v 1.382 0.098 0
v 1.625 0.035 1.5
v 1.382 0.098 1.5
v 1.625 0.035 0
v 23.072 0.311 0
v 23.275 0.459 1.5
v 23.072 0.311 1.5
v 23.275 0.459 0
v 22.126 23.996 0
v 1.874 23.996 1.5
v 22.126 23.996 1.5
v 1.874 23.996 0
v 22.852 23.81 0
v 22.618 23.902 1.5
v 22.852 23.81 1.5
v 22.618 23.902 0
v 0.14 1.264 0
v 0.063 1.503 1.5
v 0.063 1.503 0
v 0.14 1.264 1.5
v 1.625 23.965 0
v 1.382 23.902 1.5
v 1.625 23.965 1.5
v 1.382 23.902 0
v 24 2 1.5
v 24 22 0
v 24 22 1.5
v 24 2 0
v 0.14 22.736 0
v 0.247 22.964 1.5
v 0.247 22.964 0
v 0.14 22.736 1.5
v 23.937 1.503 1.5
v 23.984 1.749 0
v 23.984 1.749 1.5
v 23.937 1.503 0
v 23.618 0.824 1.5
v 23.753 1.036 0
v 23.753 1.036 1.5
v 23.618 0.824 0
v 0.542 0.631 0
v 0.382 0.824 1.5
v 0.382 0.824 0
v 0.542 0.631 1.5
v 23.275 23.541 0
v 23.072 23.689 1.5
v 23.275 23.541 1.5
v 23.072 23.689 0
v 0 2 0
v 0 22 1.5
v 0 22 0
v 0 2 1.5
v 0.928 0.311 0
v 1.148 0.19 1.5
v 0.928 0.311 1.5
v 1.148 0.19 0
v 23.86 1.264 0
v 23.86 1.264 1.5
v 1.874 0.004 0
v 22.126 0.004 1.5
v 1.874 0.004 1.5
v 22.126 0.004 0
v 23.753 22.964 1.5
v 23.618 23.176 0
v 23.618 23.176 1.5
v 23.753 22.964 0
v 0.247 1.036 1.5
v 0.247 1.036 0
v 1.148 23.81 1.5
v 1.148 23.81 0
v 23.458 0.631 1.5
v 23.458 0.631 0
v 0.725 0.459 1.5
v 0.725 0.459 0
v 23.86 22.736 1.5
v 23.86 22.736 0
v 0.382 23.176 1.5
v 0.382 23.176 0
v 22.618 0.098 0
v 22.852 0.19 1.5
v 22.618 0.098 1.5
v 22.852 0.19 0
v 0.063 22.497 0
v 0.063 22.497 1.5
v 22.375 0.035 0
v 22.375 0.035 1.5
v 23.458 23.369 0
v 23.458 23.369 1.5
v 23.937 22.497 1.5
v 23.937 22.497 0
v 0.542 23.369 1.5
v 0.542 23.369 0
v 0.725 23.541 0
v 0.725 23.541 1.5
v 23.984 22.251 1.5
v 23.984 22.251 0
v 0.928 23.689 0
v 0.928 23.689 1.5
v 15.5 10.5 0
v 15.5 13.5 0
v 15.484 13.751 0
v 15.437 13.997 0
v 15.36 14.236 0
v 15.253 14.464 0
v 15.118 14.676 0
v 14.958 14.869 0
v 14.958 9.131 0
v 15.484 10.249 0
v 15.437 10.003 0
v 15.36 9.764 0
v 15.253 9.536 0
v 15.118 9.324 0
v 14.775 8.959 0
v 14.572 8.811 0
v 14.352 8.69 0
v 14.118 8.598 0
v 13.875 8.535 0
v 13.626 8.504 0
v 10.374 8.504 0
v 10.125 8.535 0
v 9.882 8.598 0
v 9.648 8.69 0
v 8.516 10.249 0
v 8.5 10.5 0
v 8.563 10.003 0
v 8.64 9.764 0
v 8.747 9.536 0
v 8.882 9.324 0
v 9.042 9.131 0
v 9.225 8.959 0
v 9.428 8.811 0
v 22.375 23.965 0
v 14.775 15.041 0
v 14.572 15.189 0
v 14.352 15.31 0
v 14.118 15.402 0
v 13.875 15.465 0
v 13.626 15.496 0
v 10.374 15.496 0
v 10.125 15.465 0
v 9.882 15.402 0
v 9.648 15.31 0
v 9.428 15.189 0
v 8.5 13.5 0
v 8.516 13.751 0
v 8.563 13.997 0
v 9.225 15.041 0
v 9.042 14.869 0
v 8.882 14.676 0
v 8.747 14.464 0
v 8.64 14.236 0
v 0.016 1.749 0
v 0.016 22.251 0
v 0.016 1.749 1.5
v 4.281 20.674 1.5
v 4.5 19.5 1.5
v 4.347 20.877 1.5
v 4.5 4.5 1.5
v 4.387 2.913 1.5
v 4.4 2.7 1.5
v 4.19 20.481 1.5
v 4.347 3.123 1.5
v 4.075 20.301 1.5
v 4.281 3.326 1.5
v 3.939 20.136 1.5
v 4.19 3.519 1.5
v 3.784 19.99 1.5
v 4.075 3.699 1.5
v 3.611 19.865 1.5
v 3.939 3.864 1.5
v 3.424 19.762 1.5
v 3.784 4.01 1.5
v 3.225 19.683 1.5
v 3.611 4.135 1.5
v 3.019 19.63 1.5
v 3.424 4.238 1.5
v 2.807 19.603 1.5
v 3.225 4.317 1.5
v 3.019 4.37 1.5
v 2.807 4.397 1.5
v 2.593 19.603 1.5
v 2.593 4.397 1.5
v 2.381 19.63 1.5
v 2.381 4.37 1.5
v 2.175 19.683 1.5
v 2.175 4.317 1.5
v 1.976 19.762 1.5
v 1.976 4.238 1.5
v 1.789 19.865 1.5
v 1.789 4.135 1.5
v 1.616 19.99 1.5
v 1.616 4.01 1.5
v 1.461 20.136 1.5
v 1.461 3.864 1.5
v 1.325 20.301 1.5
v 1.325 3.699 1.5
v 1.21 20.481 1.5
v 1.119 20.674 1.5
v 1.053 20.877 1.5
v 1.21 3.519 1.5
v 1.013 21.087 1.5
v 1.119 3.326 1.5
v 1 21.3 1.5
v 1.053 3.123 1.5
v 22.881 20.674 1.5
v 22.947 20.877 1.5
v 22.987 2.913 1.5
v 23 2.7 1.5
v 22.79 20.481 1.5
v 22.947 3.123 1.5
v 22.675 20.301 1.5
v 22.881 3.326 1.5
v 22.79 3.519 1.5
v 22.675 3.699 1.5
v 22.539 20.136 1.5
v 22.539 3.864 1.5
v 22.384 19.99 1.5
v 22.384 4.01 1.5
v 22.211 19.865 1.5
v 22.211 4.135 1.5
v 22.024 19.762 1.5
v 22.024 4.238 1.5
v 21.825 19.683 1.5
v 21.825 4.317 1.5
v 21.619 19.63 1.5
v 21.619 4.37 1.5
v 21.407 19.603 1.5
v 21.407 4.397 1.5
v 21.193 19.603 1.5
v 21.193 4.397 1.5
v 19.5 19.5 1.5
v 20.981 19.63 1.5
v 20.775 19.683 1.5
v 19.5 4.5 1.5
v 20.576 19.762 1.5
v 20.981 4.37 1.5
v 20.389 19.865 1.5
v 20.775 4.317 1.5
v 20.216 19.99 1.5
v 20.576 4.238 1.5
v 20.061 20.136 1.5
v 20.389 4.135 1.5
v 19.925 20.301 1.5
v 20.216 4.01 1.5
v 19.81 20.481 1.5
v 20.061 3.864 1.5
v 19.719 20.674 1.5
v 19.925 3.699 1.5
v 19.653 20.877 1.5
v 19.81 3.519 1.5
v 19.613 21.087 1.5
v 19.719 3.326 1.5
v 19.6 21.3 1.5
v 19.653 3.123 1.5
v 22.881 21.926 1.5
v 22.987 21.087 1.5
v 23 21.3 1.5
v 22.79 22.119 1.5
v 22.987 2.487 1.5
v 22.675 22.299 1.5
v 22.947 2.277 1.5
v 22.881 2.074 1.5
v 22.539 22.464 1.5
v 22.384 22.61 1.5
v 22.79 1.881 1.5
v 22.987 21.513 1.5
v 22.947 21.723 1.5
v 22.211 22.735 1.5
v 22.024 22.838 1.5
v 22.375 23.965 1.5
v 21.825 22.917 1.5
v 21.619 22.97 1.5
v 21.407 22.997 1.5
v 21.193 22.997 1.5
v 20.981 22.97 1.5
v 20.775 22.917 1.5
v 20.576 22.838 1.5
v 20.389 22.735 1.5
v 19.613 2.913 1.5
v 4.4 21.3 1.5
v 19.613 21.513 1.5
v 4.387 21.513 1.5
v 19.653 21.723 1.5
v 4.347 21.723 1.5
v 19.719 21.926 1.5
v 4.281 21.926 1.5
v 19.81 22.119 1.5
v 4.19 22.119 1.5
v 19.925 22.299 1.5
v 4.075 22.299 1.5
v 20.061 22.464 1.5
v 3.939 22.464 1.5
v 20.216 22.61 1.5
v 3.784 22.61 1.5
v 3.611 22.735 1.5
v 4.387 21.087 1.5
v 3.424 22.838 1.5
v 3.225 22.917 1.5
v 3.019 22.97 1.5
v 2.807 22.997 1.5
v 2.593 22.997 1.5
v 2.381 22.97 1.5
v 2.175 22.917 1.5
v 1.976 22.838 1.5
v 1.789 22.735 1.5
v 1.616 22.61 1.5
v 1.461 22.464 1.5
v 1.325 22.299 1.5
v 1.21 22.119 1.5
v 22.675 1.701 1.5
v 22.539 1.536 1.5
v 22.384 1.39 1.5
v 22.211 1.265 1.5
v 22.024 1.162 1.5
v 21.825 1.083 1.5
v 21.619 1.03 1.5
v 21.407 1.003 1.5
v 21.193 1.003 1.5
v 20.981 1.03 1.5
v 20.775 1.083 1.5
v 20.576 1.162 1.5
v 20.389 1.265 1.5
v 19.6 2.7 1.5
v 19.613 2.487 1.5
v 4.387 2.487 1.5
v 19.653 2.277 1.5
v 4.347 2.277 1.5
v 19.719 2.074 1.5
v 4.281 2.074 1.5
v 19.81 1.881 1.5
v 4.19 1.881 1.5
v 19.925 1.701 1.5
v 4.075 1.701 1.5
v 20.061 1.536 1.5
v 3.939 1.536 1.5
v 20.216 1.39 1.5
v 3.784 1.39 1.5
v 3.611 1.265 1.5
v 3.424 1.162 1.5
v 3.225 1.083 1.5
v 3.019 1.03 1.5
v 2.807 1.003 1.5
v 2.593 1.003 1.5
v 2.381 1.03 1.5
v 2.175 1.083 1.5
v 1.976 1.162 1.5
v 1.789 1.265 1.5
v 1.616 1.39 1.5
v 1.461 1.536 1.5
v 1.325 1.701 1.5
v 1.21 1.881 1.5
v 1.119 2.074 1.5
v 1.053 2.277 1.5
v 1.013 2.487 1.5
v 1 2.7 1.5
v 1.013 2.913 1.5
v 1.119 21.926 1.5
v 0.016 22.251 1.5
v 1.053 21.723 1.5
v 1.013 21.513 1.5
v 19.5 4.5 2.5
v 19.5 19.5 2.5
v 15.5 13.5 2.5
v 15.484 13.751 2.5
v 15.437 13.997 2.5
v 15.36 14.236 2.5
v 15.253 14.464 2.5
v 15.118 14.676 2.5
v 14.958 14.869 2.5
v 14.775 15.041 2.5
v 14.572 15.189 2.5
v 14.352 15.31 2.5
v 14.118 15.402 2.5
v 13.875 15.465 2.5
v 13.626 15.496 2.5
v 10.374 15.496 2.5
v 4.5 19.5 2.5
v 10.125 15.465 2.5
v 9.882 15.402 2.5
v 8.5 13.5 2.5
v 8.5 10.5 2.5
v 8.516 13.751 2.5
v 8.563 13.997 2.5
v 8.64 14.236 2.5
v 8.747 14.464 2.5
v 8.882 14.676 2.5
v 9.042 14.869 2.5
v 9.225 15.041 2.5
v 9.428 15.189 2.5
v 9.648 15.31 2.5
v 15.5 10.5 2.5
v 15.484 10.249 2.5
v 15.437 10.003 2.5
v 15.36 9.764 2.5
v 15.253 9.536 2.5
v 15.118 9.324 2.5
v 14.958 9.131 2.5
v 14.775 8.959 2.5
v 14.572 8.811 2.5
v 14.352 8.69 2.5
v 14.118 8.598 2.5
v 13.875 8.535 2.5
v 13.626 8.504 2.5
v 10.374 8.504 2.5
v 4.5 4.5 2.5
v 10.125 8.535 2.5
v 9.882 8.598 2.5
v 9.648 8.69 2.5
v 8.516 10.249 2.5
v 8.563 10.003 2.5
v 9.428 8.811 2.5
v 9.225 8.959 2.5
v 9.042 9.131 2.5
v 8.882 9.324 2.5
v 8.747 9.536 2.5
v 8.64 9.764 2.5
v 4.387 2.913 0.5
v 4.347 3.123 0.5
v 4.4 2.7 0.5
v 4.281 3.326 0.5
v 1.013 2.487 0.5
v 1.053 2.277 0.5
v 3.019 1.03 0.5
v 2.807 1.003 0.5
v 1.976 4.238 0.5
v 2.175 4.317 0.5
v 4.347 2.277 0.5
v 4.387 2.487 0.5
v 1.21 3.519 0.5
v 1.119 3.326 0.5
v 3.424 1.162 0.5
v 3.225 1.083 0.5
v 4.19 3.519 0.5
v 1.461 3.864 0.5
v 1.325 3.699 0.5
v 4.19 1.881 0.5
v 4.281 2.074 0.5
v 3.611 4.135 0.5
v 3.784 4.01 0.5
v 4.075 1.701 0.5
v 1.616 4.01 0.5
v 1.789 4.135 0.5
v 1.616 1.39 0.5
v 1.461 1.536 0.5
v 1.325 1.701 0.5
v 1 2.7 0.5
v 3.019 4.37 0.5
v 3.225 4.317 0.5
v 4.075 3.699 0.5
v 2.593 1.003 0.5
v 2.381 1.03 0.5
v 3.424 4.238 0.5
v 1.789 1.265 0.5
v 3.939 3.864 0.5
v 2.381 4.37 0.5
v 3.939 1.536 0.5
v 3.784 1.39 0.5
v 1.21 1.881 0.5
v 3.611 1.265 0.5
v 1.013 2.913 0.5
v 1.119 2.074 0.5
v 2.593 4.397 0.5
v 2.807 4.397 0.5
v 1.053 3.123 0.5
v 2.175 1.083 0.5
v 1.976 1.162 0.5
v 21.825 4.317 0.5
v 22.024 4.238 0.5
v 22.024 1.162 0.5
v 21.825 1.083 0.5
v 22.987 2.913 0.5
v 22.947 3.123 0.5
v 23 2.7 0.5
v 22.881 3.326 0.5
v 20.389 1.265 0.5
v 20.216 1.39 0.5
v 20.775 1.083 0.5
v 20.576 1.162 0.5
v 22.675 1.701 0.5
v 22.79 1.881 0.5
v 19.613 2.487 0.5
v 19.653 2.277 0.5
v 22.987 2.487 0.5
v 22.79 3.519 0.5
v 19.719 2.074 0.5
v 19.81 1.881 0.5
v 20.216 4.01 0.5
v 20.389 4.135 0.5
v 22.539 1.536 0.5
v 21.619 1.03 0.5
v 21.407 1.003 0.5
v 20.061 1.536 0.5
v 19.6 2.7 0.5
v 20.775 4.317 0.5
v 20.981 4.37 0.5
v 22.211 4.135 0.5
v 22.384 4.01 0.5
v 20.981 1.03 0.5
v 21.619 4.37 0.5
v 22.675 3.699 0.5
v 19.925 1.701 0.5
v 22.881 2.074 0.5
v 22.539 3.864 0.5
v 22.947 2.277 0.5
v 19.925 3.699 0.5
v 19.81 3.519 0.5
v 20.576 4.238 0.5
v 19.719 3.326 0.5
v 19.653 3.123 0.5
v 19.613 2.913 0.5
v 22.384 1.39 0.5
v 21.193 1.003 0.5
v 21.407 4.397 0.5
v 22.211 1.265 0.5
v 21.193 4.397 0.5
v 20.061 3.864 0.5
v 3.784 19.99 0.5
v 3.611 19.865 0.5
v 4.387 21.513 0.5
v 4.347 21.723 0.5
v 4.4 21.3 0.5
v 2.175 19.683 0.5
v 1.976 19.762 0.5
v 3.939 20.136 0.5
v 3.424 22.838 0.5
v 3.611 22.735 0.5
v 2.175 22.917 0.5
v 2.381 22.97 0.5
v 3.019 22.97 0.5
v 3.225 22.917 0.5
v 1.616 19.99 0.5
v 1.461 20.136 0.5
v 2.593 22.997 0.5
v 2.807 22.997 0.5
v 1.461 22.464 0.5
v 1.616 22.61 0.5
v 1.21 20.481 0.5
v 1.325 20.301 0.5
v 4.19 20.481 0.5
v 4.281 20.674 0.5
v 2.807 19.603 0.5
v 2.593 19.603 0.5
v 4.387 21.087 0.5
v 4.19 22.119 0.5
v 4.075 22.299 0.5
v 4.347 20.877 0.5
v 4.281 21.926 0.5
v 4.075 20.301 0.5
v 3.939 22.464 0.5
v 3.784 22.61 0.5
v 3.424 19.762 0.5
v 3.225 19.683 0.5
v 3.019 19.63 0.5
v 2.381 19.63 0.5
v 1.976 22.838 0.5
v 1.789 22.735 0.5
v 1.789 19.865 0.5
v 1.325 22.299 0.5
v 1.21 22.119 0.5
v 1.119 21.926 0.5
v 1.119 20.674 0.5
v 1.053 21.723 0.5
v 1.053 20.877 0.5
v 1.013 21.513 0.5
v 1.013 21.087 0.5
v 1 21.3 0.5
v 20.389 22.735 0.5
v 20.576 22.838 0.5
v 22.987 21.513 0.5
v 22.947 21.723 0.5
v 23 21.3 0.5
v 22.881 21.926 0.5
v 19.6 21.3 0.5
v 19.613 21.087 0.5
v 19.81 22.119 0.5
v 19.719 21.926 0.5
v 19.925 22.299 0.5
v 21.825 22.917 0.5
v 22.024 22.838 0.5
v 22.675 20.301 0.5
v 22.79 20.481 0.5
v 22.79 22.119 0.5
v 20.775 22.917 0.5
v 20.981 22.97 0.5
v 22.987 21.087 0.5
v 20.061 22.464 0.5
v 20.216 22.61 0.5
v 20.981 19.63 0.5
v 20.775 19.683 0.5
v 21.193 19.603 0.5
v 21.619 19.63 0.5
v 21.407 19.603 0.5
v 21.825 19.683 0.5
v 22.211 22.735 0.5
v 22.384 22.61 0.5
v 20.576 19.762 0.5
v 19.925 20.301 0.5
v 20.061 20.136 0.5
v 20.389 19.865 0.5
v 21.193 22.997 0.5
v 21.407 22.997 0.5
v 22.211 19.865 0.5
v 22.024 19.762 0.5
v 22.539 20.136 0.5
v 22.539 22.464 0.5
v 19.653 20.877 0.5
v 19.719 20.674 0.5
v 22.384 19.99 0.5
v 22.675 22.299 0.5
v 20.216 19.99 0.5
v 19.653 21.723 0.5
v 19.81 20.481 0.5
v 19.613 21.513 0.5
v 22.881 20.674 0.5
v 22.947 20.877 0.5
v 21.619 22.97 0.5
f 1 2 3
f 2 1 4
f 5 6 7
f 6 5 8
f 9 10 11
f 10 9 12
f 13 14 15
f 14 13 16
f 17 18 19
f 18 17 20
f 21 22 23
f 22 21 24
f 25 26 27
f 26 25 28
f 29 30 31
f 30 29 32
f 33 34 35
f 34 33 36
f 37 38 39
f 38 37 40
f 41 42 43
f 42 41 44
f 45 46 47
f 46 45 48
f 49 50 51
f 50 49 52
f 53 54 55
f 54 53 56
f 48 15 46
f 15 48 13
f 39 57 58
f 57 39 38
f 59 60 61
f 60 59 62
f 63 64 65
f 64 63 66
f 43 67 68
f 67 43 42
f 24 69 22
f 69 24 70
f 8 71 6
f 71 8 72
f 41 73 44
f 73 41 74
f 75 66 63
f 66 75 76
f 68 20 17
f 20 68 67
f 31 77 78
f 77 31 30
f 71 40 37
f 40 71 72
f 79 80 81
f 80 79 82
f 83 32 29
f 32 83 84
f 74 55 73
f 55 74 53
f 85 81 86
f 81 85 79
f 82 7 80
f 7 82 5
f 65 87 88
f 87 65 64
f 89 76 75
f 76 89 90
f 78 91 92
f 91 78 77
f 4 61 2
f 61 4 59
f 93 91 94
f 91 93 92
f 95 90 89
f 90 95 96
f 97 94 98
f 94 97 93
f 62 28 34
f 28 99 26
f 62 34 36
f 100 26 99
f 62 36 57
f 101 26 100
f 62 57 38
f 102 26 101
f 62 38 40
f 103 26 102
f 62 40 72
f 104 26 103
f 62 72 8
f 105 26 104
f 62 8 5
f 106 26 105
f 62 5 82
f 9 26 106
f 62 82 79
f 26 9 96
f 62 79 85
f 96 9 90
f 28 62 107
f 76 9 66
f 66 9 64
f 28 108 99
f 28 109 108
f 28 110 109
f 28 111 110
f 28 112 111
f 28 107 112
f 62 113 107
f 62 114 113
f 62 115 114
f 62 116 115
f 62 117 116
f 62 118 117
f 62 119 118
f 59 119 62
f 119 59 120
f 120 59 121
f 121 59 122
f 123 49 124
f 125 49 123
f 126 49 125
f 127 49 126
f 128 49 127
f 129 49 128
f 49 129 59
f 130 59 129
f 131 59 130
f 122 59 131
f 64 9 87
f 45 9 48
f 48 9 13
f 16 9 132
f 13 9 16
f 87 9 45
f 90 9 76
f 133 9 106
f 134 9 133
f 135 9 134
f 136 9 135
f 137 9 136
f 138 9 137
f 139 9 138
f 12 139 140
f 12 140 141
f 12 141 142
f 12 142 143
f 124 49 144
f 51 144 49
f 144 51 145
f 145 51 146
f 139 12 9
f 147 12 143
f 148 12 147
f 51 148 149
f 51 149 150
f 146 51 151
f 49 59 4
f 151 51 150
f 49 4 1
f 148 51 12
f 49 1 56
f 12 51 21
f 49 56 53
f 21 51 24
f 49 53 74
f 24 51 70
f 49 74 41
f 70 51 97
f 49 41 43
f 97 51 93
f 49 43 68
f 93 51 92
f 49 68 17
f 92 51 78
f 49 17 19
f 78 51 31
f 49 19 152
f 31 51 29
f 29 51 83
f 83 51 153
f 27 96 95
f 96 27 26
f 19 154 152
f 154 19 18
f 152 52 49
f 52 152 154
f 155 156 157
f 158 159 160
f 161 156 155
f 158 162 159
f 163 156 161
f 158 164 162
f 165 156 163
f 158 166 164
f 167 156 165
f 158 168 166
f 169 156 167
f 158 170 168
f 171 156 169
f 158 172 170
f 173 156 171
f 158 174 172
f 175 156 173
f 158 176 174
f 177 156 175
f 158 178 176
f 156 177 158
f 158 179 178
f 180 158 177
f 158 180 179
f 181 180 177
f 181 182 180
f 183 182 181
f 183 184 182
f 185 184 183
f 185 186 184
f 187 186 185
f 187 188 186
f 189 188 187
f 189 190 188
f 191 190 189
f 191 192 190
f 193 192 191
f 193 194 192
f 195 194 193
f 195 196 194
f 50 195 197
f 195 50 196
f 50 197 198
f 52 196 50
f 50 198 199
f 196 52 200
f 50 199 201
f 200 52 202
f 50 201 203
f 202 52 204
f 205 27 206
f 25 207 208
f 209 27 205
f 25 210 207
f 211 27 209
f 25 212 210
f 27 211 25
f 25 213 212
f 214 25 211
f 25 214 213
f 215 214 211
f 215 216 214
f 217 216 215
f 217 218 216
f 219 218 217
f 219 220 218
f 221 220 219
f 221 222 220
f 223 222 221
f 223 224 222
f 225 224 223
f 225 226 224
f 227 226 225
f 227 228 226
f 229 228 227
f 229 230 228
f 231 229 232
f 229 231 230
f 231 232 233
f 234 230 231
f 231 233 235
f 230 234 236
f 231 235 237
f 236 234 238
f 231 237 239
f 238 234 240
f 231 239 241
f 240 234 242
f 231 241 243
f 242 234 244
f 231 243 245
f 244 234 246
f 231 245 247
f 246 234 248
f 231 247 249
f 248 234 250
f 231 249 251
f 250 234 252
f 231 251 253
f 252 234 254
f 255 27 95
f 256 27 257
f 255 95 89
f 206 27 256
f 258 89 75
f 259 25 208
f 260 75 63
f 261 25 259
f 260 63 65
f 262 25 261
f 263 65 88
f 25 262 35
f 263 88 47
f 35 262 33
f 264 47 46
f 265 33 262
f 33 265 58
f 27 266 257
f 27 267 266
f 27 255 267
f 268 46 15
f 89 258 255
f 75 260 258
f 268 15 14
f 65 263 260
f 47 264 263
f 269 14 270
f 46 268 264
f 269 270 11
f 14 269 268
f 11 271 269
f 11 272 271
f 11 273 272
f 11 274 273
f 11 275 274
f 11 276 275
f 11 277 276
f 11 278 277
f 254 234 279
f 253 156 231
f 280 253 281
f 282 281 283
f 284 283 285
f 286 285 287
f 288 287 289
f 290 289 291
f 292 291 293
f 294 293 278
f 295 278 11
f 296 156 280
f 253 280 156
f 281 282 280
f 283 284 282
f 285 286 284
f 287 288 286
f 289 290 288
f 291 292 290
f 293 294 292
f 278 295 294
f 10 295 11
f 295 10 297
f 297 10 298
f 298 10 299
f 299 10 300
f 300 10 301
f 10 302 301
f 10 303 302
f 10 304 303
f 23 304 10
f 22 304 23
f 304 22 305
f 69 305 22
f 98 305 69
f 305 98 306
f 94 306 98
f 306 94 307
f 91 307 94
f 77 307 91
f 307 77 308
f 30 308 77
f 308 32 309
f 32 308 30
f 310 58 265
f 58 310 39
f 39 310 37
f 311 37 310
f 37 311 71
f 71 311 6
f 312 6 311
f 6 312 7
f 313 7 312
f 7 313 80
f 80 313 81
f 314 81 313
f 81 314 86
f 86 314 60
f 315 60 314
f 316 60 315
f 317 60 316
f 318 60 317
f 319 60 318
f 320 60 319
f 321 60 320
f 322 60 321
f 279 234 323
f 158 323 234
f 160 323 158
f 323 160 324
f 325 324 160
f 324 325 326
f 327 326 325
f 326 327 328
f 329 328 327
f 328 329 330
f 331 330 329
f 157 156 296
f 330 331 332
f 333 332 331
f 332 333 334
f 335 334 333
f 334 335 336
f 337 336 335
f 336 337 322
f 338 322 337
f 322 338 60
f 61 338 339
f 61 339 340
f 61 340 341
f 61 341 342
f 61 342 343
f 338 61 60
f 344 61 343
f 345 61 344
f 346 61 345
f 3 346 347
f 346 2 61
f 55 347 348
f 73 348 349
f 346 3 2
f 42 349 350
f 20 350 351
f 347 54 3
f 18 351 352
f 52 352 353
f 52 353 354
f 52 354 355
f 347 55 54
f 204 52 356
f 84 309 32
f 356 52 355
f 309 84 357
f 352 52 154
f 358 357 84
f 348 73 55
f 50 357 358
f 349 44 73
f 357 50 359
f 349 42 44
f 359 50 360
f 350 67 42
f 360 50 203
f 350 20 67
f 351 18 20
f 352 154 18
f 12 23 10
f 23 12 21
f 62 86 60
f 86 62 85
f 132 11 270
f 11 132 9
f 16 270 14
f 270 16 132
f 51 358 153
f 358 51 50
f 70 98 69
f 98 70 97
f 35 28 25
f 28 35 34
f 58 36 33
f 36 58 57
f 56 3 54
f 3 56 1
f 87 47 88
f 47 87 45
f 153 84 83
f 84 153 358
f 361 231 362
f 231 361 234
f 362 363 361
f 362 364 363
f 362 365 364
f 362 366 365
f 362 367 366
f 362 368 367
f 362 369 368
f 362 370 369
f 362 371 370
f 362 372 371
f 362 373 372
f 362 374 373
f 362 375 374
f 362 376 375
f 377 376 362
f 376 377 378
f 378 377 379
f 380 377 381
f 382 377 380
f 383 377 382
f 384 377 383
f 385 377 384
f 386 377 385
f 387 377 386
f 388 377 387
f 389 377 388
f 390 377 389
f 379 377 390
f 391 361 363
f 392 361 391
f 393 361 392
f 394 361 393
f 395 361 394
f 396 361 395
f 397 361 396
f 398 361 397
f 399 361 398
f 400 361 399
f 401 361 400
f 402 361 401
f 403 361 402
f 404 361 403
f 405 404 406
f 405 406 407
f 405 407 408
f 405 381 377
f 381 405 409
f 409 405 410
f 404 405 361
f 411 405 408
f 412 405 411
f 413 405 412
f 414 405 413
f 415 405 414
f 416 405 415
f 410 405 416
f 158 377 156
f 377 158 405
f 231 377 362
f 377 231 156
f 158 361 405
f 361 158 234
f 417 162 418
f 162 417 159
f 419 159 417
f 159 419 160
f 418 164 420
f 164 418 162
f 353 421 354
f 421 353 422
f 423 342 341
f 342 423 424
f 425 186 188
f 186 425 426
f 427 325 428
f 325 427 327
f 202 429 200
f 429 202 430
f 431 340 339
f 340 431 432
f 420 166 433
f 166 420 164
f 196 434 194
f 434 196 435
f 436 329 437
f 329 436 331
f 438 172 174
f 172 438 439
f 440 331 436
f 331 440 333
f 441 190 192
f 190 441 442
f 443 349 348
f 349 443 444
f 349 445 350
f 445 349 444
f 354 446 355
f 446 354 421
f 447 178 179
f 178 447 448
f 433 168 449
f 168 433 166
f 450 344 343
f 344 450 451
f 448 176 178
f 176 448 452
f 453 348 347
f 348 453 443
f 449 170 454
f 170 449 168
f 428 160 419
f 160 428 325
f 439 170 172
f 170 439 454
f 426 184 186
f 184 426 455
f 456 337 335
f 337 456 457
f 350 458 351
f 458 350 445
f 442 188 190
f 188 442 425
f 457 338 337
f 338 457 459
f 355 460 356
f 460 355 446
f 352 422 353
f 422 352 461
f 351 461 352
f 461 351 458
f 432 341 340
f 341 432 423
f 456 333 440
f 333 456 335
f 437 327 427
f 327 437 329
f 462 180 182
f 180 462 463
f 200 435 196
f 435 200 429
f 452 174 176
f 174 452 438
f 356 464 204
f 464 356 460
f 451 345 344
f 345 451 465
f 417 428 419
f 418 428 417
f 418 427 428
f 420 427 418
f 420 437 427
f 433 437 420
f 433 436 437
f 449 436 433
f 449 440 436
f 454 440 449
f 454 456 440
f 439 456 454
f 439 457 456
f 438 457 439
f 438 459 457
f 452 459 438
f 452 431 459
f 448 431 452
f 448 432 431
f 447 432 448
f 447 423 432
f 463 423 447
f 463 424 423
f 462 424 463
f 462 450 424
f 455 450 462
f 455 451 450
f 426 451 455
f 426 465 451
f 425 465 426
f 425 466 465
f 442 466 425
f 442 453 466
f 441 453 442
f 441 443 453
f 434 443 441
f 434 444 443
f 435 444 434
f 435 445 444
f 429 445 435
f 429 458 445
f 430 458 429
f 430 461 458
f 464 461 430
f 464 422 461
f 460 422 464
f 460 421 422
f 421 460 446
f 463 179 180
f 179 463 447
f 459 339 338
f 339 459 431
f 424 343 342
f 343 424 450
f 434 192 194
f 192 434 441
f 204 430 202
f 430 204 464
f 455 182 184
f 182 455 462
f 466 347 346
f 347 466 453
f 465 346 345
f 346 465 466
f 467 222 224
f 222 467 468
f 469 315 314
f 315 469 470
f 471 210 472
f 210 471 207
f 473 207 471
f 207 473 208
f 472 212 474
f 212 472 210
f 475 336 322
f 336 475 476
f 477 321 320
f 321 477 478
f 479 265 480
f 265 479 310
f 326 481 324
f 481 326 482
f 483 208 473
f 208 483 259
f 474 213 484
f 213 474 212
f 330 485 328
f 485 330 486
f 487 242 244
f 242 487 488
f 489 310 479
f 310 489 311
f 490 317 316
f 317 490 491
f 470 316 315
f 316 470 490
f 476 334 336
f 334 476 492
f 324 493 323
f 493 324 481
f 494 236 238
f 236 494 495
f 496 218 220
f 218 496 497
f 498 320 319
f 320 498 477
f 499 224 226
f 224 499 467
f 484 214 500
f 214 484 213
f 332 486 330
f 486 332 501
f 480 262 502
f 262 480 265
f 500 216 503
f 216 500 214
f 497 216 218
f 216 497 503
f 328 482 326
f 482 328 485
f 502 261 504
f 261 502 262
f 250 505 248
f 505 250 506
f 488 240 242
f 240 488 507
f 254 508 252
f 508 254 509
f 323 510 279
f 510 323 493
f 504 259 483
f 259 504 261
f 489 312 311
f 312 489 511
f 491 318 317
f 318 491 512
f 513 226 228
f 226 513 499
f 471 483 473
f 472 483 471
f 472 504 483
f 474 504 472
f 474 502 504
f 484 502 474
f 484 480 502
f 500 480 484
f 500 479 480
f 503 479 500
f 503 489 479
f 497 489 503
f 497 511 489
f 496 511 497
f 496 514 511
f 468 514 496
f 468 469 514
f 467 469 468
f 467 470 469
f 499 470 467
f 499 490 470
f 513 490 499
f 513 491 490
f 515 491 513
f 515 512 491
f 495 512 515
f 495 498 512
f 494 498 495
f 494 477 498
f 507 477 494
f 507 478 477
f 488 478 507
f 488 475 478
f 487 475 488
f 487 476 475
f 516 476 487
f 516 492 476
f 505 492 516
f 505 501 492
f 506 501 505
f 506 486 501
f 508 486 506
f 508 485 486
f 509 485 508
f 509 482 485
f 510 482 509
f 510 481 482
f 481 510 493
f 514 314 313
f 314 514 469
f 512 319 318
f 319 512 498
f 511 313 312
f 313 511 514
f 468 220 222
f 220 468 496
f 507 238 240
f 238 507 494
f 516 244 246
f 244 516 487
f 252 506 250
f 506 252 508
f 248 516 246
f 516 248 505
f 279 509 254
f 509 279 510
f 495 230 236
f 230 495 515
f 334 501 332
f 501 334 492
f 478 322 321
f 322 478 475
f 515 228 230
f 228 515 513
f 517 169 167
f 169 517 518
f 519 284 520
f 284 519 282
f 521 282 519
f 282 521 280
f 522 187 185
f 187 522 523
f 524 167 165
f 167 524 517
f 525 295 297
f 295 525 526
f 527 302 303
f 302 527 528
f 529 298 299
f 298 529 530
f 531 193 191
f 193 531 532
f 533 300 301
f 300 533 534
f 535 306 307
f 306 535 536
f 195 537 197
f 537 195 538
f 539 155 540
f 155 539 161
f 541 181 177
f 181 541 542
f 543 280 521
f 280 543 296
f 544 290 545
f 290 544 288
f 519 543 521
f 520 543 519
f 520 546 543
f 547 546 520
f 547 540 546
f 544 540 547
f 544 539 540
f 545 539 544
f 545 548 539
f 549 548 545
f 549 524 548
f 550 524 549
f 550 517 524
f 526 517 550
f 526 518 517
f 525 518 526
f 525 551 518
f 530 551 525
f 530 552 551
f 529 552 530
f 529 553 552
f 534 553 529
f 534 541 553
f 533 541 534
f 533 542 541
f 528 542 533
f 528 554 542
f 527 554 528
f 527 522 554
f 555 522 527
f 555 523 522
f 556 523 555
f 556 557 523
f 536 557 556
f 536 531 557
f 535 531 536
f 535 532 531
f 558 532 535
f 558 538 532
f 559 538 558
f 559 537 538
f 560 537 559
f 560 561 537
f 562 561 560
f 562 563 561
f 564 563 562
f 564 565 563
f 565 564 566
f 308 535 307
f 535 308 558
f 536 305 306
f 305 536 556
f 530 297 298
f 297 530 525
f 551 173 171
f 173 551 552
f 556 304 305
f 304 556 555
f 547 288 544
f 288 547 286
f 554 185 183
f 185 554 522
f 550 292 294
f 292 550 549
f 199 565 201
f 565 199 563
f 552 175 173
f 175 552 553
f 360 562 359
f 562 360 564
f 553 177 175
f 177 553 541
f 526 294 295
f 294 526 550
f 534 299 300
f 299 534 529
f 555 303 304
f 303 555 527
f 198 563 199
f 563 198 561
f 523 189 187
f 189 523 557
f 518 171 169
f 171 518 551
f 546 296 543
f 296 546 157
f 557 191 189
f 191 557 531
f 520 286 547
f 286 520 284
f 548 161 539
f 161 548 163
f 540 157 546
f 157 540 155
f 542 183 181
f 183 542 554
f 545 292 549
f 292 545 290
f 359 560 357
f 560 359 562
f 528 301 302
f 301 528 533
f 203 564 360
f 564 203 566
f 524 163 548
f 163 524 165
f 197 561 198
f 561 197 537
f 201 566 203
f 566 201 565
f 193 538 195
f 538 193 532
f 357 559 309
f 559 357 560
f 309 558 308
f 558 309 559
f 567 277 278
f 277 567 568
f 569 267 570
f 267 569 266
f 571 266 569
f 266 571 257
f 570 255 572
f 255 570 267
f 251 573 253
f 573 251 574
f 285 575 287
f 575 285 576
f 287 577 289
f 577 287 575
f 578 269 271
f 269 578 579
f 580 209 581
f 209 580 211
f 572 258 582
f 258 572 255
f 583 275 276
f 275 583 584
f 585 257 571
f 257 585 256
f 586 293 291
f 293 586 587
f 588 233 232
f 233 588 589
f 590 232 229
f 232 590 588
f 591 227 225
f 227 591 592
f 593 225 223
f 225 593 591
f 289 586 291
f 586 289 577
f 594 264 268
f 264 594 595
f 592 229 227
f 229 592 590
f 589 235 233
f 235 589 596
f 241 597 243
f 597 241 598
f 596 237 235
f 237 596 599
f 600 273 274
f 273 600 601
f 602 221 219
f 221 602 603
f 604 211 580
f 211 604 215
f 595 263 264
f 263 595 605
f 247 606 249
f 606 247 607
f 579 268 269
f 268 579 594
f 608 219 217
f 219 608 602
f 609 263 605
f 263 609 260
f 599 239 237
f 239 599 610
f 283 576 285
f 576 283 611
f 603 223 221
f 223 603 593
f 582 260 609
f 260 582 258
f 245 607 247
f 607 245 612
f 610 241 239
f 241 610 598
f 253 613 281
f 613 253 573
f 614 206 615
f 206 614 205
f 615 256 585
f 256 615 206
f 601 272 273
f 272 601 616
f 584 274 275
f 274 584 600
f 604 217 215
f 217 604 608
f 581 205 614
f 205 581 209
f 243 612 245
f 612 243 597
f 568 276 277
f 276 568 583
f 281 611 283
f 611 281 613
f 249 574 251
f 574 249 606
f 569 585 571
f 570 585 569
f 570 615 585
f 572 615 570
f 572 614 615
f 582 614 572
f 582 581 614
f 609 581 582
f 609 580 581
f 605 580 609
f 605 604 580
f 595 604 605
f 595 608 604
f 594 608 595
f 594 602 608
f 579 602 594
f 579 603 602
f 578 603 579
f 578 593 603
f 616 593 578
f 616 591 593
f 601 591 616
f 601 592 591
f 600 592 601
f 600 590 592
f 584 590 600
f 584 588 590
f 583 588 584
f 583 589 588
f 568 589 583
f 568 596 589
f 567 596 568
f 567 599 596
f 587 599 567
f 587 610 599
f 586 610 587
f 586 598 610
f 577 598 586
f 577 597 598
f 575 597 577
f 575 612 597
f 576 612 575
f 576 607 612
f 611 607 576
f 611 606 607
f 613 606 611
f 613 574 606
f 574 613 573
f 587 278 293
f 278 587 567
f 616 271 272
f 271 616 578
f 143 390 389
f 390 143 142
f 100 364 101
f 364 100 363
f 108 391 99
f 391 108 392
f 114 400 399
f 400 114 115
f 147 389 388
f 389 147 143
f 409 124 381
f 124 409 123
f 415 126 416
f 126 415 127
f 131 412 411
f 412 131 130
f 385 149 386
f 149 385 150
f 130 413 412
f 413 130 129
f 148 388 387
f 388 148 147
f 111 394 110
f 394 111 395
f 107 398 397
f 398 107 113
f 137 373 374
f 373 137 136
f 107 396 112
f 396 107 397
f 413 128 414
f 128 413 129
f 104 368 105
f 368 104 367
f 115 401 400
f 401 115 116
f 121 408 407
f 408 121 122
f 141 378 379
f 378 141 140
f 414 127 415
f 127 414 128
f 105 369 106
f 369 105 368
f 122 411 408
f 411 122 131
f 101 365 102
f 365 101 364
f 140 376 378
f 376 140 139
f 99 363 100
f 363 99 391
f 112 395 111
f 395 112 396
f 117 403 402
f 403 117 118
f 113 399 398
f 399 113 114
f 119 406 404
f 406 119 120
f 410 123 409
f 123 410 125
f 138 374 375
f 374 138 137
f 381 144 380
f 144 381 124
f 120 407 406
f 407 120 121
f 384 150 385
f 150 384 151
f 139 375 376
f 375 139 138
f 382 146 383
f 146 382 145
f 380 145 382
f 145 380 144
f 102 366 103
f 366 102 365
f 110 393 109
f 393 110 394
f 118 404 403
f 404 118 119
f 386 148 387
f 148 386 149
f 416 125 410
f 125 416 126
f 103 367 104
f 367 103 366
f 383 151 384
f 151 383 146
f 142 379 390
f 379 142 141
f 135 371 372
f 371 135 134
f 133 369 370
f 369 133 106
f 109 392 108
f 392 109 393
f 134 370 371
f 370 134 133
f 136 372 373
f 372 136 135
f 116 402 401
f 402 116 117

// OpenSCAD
// file: ../../lib/flat_rounded_cube.scad
$bleed = 1;
$rounding = 3;

min_cylinder_height = 1;

module flat_rounded_cube(size) {
  width = size[0] - $rounding * 2;
  length = size[1] - $rounding * 2;

  // Only 1 count of min_cynlinder_height not 2;
  // cylinder does not extend the bottom because it's flush
  height = size[2] - min_cylinder_height; 

  minkowski() {
    translate([$rounding, $rounding, 0]) {
      cube([width, length, height]);
    }
    cylinder(min_cylinder_height, $rounding, $rounding);
  }
}
// main file
echo(version=version());

include <../../lib/flat_rounded_cube.scad>

// Config
$fn = 50;
$bleed = 1;
$rounding = 2;

// Attributes
inset = 1;
magnet_height = 1;
magnet_diameter = 3.4;
corner_magnet_buffer = 1;
border_width = 4.5;
card_width = 15;
card_length = 15;
window_buffer = 4;

// Derived Attributes
base_height = magnet_height + 0.5;
corner_magnet_offset = corner_magnet_buffer + magnet_diameter / 2;

card_size = [
  card_width,
  card_length,
  inset
];

card_window_size = [
  card_size[0] - window_buffer*2,
  card_size[1] - window_buffer*2,
  base_height + inset + $bleed*2
];

base_size = [
  card_size[0] + border_width*2,
  card_size[1] + border_width*2,
  base_height
];

card_offset = [
  (base_size[0] - card_size[0]) / 2,
  (base_size[1] - card_size[1]) / 2,
  base_height
];

card_window_offset = [
  card_offset[0] + window_buffer,
  card_offset[1] + window_buffer,
  -$bleed
];

corner_hole_offsets = [
  [corner_magnet_offset, corner_magnet_offset],
  [base_size[0] - corner_magnet_offset, corner_magnet_offset],
  [corner_magnet_offset, base_size[1] - corner_magnet_offset],
  [base_size[0] - corner_magnet_offset, base_size[1] - corner_magnet_offset],
];

// Model
difference() {
  // Base
  union() {
    flat_rounded_cube(base_size);
    translate(card_offset) {
      cube(card_size);
    }
  }
  translate(card_window_offset) {
    flat_rounded_cube(card_window_size);
  }
  translate([0, 0, base_height-magnet_height]) {
    // Cut out corner magnet holes
    for (i=corner_hole_offsets) {
      translate([i[0], i[1], 0]) {
        cylinder(h=magnet_height + $bleed, d=magnet_diameter);
      }
    }
  }
}
